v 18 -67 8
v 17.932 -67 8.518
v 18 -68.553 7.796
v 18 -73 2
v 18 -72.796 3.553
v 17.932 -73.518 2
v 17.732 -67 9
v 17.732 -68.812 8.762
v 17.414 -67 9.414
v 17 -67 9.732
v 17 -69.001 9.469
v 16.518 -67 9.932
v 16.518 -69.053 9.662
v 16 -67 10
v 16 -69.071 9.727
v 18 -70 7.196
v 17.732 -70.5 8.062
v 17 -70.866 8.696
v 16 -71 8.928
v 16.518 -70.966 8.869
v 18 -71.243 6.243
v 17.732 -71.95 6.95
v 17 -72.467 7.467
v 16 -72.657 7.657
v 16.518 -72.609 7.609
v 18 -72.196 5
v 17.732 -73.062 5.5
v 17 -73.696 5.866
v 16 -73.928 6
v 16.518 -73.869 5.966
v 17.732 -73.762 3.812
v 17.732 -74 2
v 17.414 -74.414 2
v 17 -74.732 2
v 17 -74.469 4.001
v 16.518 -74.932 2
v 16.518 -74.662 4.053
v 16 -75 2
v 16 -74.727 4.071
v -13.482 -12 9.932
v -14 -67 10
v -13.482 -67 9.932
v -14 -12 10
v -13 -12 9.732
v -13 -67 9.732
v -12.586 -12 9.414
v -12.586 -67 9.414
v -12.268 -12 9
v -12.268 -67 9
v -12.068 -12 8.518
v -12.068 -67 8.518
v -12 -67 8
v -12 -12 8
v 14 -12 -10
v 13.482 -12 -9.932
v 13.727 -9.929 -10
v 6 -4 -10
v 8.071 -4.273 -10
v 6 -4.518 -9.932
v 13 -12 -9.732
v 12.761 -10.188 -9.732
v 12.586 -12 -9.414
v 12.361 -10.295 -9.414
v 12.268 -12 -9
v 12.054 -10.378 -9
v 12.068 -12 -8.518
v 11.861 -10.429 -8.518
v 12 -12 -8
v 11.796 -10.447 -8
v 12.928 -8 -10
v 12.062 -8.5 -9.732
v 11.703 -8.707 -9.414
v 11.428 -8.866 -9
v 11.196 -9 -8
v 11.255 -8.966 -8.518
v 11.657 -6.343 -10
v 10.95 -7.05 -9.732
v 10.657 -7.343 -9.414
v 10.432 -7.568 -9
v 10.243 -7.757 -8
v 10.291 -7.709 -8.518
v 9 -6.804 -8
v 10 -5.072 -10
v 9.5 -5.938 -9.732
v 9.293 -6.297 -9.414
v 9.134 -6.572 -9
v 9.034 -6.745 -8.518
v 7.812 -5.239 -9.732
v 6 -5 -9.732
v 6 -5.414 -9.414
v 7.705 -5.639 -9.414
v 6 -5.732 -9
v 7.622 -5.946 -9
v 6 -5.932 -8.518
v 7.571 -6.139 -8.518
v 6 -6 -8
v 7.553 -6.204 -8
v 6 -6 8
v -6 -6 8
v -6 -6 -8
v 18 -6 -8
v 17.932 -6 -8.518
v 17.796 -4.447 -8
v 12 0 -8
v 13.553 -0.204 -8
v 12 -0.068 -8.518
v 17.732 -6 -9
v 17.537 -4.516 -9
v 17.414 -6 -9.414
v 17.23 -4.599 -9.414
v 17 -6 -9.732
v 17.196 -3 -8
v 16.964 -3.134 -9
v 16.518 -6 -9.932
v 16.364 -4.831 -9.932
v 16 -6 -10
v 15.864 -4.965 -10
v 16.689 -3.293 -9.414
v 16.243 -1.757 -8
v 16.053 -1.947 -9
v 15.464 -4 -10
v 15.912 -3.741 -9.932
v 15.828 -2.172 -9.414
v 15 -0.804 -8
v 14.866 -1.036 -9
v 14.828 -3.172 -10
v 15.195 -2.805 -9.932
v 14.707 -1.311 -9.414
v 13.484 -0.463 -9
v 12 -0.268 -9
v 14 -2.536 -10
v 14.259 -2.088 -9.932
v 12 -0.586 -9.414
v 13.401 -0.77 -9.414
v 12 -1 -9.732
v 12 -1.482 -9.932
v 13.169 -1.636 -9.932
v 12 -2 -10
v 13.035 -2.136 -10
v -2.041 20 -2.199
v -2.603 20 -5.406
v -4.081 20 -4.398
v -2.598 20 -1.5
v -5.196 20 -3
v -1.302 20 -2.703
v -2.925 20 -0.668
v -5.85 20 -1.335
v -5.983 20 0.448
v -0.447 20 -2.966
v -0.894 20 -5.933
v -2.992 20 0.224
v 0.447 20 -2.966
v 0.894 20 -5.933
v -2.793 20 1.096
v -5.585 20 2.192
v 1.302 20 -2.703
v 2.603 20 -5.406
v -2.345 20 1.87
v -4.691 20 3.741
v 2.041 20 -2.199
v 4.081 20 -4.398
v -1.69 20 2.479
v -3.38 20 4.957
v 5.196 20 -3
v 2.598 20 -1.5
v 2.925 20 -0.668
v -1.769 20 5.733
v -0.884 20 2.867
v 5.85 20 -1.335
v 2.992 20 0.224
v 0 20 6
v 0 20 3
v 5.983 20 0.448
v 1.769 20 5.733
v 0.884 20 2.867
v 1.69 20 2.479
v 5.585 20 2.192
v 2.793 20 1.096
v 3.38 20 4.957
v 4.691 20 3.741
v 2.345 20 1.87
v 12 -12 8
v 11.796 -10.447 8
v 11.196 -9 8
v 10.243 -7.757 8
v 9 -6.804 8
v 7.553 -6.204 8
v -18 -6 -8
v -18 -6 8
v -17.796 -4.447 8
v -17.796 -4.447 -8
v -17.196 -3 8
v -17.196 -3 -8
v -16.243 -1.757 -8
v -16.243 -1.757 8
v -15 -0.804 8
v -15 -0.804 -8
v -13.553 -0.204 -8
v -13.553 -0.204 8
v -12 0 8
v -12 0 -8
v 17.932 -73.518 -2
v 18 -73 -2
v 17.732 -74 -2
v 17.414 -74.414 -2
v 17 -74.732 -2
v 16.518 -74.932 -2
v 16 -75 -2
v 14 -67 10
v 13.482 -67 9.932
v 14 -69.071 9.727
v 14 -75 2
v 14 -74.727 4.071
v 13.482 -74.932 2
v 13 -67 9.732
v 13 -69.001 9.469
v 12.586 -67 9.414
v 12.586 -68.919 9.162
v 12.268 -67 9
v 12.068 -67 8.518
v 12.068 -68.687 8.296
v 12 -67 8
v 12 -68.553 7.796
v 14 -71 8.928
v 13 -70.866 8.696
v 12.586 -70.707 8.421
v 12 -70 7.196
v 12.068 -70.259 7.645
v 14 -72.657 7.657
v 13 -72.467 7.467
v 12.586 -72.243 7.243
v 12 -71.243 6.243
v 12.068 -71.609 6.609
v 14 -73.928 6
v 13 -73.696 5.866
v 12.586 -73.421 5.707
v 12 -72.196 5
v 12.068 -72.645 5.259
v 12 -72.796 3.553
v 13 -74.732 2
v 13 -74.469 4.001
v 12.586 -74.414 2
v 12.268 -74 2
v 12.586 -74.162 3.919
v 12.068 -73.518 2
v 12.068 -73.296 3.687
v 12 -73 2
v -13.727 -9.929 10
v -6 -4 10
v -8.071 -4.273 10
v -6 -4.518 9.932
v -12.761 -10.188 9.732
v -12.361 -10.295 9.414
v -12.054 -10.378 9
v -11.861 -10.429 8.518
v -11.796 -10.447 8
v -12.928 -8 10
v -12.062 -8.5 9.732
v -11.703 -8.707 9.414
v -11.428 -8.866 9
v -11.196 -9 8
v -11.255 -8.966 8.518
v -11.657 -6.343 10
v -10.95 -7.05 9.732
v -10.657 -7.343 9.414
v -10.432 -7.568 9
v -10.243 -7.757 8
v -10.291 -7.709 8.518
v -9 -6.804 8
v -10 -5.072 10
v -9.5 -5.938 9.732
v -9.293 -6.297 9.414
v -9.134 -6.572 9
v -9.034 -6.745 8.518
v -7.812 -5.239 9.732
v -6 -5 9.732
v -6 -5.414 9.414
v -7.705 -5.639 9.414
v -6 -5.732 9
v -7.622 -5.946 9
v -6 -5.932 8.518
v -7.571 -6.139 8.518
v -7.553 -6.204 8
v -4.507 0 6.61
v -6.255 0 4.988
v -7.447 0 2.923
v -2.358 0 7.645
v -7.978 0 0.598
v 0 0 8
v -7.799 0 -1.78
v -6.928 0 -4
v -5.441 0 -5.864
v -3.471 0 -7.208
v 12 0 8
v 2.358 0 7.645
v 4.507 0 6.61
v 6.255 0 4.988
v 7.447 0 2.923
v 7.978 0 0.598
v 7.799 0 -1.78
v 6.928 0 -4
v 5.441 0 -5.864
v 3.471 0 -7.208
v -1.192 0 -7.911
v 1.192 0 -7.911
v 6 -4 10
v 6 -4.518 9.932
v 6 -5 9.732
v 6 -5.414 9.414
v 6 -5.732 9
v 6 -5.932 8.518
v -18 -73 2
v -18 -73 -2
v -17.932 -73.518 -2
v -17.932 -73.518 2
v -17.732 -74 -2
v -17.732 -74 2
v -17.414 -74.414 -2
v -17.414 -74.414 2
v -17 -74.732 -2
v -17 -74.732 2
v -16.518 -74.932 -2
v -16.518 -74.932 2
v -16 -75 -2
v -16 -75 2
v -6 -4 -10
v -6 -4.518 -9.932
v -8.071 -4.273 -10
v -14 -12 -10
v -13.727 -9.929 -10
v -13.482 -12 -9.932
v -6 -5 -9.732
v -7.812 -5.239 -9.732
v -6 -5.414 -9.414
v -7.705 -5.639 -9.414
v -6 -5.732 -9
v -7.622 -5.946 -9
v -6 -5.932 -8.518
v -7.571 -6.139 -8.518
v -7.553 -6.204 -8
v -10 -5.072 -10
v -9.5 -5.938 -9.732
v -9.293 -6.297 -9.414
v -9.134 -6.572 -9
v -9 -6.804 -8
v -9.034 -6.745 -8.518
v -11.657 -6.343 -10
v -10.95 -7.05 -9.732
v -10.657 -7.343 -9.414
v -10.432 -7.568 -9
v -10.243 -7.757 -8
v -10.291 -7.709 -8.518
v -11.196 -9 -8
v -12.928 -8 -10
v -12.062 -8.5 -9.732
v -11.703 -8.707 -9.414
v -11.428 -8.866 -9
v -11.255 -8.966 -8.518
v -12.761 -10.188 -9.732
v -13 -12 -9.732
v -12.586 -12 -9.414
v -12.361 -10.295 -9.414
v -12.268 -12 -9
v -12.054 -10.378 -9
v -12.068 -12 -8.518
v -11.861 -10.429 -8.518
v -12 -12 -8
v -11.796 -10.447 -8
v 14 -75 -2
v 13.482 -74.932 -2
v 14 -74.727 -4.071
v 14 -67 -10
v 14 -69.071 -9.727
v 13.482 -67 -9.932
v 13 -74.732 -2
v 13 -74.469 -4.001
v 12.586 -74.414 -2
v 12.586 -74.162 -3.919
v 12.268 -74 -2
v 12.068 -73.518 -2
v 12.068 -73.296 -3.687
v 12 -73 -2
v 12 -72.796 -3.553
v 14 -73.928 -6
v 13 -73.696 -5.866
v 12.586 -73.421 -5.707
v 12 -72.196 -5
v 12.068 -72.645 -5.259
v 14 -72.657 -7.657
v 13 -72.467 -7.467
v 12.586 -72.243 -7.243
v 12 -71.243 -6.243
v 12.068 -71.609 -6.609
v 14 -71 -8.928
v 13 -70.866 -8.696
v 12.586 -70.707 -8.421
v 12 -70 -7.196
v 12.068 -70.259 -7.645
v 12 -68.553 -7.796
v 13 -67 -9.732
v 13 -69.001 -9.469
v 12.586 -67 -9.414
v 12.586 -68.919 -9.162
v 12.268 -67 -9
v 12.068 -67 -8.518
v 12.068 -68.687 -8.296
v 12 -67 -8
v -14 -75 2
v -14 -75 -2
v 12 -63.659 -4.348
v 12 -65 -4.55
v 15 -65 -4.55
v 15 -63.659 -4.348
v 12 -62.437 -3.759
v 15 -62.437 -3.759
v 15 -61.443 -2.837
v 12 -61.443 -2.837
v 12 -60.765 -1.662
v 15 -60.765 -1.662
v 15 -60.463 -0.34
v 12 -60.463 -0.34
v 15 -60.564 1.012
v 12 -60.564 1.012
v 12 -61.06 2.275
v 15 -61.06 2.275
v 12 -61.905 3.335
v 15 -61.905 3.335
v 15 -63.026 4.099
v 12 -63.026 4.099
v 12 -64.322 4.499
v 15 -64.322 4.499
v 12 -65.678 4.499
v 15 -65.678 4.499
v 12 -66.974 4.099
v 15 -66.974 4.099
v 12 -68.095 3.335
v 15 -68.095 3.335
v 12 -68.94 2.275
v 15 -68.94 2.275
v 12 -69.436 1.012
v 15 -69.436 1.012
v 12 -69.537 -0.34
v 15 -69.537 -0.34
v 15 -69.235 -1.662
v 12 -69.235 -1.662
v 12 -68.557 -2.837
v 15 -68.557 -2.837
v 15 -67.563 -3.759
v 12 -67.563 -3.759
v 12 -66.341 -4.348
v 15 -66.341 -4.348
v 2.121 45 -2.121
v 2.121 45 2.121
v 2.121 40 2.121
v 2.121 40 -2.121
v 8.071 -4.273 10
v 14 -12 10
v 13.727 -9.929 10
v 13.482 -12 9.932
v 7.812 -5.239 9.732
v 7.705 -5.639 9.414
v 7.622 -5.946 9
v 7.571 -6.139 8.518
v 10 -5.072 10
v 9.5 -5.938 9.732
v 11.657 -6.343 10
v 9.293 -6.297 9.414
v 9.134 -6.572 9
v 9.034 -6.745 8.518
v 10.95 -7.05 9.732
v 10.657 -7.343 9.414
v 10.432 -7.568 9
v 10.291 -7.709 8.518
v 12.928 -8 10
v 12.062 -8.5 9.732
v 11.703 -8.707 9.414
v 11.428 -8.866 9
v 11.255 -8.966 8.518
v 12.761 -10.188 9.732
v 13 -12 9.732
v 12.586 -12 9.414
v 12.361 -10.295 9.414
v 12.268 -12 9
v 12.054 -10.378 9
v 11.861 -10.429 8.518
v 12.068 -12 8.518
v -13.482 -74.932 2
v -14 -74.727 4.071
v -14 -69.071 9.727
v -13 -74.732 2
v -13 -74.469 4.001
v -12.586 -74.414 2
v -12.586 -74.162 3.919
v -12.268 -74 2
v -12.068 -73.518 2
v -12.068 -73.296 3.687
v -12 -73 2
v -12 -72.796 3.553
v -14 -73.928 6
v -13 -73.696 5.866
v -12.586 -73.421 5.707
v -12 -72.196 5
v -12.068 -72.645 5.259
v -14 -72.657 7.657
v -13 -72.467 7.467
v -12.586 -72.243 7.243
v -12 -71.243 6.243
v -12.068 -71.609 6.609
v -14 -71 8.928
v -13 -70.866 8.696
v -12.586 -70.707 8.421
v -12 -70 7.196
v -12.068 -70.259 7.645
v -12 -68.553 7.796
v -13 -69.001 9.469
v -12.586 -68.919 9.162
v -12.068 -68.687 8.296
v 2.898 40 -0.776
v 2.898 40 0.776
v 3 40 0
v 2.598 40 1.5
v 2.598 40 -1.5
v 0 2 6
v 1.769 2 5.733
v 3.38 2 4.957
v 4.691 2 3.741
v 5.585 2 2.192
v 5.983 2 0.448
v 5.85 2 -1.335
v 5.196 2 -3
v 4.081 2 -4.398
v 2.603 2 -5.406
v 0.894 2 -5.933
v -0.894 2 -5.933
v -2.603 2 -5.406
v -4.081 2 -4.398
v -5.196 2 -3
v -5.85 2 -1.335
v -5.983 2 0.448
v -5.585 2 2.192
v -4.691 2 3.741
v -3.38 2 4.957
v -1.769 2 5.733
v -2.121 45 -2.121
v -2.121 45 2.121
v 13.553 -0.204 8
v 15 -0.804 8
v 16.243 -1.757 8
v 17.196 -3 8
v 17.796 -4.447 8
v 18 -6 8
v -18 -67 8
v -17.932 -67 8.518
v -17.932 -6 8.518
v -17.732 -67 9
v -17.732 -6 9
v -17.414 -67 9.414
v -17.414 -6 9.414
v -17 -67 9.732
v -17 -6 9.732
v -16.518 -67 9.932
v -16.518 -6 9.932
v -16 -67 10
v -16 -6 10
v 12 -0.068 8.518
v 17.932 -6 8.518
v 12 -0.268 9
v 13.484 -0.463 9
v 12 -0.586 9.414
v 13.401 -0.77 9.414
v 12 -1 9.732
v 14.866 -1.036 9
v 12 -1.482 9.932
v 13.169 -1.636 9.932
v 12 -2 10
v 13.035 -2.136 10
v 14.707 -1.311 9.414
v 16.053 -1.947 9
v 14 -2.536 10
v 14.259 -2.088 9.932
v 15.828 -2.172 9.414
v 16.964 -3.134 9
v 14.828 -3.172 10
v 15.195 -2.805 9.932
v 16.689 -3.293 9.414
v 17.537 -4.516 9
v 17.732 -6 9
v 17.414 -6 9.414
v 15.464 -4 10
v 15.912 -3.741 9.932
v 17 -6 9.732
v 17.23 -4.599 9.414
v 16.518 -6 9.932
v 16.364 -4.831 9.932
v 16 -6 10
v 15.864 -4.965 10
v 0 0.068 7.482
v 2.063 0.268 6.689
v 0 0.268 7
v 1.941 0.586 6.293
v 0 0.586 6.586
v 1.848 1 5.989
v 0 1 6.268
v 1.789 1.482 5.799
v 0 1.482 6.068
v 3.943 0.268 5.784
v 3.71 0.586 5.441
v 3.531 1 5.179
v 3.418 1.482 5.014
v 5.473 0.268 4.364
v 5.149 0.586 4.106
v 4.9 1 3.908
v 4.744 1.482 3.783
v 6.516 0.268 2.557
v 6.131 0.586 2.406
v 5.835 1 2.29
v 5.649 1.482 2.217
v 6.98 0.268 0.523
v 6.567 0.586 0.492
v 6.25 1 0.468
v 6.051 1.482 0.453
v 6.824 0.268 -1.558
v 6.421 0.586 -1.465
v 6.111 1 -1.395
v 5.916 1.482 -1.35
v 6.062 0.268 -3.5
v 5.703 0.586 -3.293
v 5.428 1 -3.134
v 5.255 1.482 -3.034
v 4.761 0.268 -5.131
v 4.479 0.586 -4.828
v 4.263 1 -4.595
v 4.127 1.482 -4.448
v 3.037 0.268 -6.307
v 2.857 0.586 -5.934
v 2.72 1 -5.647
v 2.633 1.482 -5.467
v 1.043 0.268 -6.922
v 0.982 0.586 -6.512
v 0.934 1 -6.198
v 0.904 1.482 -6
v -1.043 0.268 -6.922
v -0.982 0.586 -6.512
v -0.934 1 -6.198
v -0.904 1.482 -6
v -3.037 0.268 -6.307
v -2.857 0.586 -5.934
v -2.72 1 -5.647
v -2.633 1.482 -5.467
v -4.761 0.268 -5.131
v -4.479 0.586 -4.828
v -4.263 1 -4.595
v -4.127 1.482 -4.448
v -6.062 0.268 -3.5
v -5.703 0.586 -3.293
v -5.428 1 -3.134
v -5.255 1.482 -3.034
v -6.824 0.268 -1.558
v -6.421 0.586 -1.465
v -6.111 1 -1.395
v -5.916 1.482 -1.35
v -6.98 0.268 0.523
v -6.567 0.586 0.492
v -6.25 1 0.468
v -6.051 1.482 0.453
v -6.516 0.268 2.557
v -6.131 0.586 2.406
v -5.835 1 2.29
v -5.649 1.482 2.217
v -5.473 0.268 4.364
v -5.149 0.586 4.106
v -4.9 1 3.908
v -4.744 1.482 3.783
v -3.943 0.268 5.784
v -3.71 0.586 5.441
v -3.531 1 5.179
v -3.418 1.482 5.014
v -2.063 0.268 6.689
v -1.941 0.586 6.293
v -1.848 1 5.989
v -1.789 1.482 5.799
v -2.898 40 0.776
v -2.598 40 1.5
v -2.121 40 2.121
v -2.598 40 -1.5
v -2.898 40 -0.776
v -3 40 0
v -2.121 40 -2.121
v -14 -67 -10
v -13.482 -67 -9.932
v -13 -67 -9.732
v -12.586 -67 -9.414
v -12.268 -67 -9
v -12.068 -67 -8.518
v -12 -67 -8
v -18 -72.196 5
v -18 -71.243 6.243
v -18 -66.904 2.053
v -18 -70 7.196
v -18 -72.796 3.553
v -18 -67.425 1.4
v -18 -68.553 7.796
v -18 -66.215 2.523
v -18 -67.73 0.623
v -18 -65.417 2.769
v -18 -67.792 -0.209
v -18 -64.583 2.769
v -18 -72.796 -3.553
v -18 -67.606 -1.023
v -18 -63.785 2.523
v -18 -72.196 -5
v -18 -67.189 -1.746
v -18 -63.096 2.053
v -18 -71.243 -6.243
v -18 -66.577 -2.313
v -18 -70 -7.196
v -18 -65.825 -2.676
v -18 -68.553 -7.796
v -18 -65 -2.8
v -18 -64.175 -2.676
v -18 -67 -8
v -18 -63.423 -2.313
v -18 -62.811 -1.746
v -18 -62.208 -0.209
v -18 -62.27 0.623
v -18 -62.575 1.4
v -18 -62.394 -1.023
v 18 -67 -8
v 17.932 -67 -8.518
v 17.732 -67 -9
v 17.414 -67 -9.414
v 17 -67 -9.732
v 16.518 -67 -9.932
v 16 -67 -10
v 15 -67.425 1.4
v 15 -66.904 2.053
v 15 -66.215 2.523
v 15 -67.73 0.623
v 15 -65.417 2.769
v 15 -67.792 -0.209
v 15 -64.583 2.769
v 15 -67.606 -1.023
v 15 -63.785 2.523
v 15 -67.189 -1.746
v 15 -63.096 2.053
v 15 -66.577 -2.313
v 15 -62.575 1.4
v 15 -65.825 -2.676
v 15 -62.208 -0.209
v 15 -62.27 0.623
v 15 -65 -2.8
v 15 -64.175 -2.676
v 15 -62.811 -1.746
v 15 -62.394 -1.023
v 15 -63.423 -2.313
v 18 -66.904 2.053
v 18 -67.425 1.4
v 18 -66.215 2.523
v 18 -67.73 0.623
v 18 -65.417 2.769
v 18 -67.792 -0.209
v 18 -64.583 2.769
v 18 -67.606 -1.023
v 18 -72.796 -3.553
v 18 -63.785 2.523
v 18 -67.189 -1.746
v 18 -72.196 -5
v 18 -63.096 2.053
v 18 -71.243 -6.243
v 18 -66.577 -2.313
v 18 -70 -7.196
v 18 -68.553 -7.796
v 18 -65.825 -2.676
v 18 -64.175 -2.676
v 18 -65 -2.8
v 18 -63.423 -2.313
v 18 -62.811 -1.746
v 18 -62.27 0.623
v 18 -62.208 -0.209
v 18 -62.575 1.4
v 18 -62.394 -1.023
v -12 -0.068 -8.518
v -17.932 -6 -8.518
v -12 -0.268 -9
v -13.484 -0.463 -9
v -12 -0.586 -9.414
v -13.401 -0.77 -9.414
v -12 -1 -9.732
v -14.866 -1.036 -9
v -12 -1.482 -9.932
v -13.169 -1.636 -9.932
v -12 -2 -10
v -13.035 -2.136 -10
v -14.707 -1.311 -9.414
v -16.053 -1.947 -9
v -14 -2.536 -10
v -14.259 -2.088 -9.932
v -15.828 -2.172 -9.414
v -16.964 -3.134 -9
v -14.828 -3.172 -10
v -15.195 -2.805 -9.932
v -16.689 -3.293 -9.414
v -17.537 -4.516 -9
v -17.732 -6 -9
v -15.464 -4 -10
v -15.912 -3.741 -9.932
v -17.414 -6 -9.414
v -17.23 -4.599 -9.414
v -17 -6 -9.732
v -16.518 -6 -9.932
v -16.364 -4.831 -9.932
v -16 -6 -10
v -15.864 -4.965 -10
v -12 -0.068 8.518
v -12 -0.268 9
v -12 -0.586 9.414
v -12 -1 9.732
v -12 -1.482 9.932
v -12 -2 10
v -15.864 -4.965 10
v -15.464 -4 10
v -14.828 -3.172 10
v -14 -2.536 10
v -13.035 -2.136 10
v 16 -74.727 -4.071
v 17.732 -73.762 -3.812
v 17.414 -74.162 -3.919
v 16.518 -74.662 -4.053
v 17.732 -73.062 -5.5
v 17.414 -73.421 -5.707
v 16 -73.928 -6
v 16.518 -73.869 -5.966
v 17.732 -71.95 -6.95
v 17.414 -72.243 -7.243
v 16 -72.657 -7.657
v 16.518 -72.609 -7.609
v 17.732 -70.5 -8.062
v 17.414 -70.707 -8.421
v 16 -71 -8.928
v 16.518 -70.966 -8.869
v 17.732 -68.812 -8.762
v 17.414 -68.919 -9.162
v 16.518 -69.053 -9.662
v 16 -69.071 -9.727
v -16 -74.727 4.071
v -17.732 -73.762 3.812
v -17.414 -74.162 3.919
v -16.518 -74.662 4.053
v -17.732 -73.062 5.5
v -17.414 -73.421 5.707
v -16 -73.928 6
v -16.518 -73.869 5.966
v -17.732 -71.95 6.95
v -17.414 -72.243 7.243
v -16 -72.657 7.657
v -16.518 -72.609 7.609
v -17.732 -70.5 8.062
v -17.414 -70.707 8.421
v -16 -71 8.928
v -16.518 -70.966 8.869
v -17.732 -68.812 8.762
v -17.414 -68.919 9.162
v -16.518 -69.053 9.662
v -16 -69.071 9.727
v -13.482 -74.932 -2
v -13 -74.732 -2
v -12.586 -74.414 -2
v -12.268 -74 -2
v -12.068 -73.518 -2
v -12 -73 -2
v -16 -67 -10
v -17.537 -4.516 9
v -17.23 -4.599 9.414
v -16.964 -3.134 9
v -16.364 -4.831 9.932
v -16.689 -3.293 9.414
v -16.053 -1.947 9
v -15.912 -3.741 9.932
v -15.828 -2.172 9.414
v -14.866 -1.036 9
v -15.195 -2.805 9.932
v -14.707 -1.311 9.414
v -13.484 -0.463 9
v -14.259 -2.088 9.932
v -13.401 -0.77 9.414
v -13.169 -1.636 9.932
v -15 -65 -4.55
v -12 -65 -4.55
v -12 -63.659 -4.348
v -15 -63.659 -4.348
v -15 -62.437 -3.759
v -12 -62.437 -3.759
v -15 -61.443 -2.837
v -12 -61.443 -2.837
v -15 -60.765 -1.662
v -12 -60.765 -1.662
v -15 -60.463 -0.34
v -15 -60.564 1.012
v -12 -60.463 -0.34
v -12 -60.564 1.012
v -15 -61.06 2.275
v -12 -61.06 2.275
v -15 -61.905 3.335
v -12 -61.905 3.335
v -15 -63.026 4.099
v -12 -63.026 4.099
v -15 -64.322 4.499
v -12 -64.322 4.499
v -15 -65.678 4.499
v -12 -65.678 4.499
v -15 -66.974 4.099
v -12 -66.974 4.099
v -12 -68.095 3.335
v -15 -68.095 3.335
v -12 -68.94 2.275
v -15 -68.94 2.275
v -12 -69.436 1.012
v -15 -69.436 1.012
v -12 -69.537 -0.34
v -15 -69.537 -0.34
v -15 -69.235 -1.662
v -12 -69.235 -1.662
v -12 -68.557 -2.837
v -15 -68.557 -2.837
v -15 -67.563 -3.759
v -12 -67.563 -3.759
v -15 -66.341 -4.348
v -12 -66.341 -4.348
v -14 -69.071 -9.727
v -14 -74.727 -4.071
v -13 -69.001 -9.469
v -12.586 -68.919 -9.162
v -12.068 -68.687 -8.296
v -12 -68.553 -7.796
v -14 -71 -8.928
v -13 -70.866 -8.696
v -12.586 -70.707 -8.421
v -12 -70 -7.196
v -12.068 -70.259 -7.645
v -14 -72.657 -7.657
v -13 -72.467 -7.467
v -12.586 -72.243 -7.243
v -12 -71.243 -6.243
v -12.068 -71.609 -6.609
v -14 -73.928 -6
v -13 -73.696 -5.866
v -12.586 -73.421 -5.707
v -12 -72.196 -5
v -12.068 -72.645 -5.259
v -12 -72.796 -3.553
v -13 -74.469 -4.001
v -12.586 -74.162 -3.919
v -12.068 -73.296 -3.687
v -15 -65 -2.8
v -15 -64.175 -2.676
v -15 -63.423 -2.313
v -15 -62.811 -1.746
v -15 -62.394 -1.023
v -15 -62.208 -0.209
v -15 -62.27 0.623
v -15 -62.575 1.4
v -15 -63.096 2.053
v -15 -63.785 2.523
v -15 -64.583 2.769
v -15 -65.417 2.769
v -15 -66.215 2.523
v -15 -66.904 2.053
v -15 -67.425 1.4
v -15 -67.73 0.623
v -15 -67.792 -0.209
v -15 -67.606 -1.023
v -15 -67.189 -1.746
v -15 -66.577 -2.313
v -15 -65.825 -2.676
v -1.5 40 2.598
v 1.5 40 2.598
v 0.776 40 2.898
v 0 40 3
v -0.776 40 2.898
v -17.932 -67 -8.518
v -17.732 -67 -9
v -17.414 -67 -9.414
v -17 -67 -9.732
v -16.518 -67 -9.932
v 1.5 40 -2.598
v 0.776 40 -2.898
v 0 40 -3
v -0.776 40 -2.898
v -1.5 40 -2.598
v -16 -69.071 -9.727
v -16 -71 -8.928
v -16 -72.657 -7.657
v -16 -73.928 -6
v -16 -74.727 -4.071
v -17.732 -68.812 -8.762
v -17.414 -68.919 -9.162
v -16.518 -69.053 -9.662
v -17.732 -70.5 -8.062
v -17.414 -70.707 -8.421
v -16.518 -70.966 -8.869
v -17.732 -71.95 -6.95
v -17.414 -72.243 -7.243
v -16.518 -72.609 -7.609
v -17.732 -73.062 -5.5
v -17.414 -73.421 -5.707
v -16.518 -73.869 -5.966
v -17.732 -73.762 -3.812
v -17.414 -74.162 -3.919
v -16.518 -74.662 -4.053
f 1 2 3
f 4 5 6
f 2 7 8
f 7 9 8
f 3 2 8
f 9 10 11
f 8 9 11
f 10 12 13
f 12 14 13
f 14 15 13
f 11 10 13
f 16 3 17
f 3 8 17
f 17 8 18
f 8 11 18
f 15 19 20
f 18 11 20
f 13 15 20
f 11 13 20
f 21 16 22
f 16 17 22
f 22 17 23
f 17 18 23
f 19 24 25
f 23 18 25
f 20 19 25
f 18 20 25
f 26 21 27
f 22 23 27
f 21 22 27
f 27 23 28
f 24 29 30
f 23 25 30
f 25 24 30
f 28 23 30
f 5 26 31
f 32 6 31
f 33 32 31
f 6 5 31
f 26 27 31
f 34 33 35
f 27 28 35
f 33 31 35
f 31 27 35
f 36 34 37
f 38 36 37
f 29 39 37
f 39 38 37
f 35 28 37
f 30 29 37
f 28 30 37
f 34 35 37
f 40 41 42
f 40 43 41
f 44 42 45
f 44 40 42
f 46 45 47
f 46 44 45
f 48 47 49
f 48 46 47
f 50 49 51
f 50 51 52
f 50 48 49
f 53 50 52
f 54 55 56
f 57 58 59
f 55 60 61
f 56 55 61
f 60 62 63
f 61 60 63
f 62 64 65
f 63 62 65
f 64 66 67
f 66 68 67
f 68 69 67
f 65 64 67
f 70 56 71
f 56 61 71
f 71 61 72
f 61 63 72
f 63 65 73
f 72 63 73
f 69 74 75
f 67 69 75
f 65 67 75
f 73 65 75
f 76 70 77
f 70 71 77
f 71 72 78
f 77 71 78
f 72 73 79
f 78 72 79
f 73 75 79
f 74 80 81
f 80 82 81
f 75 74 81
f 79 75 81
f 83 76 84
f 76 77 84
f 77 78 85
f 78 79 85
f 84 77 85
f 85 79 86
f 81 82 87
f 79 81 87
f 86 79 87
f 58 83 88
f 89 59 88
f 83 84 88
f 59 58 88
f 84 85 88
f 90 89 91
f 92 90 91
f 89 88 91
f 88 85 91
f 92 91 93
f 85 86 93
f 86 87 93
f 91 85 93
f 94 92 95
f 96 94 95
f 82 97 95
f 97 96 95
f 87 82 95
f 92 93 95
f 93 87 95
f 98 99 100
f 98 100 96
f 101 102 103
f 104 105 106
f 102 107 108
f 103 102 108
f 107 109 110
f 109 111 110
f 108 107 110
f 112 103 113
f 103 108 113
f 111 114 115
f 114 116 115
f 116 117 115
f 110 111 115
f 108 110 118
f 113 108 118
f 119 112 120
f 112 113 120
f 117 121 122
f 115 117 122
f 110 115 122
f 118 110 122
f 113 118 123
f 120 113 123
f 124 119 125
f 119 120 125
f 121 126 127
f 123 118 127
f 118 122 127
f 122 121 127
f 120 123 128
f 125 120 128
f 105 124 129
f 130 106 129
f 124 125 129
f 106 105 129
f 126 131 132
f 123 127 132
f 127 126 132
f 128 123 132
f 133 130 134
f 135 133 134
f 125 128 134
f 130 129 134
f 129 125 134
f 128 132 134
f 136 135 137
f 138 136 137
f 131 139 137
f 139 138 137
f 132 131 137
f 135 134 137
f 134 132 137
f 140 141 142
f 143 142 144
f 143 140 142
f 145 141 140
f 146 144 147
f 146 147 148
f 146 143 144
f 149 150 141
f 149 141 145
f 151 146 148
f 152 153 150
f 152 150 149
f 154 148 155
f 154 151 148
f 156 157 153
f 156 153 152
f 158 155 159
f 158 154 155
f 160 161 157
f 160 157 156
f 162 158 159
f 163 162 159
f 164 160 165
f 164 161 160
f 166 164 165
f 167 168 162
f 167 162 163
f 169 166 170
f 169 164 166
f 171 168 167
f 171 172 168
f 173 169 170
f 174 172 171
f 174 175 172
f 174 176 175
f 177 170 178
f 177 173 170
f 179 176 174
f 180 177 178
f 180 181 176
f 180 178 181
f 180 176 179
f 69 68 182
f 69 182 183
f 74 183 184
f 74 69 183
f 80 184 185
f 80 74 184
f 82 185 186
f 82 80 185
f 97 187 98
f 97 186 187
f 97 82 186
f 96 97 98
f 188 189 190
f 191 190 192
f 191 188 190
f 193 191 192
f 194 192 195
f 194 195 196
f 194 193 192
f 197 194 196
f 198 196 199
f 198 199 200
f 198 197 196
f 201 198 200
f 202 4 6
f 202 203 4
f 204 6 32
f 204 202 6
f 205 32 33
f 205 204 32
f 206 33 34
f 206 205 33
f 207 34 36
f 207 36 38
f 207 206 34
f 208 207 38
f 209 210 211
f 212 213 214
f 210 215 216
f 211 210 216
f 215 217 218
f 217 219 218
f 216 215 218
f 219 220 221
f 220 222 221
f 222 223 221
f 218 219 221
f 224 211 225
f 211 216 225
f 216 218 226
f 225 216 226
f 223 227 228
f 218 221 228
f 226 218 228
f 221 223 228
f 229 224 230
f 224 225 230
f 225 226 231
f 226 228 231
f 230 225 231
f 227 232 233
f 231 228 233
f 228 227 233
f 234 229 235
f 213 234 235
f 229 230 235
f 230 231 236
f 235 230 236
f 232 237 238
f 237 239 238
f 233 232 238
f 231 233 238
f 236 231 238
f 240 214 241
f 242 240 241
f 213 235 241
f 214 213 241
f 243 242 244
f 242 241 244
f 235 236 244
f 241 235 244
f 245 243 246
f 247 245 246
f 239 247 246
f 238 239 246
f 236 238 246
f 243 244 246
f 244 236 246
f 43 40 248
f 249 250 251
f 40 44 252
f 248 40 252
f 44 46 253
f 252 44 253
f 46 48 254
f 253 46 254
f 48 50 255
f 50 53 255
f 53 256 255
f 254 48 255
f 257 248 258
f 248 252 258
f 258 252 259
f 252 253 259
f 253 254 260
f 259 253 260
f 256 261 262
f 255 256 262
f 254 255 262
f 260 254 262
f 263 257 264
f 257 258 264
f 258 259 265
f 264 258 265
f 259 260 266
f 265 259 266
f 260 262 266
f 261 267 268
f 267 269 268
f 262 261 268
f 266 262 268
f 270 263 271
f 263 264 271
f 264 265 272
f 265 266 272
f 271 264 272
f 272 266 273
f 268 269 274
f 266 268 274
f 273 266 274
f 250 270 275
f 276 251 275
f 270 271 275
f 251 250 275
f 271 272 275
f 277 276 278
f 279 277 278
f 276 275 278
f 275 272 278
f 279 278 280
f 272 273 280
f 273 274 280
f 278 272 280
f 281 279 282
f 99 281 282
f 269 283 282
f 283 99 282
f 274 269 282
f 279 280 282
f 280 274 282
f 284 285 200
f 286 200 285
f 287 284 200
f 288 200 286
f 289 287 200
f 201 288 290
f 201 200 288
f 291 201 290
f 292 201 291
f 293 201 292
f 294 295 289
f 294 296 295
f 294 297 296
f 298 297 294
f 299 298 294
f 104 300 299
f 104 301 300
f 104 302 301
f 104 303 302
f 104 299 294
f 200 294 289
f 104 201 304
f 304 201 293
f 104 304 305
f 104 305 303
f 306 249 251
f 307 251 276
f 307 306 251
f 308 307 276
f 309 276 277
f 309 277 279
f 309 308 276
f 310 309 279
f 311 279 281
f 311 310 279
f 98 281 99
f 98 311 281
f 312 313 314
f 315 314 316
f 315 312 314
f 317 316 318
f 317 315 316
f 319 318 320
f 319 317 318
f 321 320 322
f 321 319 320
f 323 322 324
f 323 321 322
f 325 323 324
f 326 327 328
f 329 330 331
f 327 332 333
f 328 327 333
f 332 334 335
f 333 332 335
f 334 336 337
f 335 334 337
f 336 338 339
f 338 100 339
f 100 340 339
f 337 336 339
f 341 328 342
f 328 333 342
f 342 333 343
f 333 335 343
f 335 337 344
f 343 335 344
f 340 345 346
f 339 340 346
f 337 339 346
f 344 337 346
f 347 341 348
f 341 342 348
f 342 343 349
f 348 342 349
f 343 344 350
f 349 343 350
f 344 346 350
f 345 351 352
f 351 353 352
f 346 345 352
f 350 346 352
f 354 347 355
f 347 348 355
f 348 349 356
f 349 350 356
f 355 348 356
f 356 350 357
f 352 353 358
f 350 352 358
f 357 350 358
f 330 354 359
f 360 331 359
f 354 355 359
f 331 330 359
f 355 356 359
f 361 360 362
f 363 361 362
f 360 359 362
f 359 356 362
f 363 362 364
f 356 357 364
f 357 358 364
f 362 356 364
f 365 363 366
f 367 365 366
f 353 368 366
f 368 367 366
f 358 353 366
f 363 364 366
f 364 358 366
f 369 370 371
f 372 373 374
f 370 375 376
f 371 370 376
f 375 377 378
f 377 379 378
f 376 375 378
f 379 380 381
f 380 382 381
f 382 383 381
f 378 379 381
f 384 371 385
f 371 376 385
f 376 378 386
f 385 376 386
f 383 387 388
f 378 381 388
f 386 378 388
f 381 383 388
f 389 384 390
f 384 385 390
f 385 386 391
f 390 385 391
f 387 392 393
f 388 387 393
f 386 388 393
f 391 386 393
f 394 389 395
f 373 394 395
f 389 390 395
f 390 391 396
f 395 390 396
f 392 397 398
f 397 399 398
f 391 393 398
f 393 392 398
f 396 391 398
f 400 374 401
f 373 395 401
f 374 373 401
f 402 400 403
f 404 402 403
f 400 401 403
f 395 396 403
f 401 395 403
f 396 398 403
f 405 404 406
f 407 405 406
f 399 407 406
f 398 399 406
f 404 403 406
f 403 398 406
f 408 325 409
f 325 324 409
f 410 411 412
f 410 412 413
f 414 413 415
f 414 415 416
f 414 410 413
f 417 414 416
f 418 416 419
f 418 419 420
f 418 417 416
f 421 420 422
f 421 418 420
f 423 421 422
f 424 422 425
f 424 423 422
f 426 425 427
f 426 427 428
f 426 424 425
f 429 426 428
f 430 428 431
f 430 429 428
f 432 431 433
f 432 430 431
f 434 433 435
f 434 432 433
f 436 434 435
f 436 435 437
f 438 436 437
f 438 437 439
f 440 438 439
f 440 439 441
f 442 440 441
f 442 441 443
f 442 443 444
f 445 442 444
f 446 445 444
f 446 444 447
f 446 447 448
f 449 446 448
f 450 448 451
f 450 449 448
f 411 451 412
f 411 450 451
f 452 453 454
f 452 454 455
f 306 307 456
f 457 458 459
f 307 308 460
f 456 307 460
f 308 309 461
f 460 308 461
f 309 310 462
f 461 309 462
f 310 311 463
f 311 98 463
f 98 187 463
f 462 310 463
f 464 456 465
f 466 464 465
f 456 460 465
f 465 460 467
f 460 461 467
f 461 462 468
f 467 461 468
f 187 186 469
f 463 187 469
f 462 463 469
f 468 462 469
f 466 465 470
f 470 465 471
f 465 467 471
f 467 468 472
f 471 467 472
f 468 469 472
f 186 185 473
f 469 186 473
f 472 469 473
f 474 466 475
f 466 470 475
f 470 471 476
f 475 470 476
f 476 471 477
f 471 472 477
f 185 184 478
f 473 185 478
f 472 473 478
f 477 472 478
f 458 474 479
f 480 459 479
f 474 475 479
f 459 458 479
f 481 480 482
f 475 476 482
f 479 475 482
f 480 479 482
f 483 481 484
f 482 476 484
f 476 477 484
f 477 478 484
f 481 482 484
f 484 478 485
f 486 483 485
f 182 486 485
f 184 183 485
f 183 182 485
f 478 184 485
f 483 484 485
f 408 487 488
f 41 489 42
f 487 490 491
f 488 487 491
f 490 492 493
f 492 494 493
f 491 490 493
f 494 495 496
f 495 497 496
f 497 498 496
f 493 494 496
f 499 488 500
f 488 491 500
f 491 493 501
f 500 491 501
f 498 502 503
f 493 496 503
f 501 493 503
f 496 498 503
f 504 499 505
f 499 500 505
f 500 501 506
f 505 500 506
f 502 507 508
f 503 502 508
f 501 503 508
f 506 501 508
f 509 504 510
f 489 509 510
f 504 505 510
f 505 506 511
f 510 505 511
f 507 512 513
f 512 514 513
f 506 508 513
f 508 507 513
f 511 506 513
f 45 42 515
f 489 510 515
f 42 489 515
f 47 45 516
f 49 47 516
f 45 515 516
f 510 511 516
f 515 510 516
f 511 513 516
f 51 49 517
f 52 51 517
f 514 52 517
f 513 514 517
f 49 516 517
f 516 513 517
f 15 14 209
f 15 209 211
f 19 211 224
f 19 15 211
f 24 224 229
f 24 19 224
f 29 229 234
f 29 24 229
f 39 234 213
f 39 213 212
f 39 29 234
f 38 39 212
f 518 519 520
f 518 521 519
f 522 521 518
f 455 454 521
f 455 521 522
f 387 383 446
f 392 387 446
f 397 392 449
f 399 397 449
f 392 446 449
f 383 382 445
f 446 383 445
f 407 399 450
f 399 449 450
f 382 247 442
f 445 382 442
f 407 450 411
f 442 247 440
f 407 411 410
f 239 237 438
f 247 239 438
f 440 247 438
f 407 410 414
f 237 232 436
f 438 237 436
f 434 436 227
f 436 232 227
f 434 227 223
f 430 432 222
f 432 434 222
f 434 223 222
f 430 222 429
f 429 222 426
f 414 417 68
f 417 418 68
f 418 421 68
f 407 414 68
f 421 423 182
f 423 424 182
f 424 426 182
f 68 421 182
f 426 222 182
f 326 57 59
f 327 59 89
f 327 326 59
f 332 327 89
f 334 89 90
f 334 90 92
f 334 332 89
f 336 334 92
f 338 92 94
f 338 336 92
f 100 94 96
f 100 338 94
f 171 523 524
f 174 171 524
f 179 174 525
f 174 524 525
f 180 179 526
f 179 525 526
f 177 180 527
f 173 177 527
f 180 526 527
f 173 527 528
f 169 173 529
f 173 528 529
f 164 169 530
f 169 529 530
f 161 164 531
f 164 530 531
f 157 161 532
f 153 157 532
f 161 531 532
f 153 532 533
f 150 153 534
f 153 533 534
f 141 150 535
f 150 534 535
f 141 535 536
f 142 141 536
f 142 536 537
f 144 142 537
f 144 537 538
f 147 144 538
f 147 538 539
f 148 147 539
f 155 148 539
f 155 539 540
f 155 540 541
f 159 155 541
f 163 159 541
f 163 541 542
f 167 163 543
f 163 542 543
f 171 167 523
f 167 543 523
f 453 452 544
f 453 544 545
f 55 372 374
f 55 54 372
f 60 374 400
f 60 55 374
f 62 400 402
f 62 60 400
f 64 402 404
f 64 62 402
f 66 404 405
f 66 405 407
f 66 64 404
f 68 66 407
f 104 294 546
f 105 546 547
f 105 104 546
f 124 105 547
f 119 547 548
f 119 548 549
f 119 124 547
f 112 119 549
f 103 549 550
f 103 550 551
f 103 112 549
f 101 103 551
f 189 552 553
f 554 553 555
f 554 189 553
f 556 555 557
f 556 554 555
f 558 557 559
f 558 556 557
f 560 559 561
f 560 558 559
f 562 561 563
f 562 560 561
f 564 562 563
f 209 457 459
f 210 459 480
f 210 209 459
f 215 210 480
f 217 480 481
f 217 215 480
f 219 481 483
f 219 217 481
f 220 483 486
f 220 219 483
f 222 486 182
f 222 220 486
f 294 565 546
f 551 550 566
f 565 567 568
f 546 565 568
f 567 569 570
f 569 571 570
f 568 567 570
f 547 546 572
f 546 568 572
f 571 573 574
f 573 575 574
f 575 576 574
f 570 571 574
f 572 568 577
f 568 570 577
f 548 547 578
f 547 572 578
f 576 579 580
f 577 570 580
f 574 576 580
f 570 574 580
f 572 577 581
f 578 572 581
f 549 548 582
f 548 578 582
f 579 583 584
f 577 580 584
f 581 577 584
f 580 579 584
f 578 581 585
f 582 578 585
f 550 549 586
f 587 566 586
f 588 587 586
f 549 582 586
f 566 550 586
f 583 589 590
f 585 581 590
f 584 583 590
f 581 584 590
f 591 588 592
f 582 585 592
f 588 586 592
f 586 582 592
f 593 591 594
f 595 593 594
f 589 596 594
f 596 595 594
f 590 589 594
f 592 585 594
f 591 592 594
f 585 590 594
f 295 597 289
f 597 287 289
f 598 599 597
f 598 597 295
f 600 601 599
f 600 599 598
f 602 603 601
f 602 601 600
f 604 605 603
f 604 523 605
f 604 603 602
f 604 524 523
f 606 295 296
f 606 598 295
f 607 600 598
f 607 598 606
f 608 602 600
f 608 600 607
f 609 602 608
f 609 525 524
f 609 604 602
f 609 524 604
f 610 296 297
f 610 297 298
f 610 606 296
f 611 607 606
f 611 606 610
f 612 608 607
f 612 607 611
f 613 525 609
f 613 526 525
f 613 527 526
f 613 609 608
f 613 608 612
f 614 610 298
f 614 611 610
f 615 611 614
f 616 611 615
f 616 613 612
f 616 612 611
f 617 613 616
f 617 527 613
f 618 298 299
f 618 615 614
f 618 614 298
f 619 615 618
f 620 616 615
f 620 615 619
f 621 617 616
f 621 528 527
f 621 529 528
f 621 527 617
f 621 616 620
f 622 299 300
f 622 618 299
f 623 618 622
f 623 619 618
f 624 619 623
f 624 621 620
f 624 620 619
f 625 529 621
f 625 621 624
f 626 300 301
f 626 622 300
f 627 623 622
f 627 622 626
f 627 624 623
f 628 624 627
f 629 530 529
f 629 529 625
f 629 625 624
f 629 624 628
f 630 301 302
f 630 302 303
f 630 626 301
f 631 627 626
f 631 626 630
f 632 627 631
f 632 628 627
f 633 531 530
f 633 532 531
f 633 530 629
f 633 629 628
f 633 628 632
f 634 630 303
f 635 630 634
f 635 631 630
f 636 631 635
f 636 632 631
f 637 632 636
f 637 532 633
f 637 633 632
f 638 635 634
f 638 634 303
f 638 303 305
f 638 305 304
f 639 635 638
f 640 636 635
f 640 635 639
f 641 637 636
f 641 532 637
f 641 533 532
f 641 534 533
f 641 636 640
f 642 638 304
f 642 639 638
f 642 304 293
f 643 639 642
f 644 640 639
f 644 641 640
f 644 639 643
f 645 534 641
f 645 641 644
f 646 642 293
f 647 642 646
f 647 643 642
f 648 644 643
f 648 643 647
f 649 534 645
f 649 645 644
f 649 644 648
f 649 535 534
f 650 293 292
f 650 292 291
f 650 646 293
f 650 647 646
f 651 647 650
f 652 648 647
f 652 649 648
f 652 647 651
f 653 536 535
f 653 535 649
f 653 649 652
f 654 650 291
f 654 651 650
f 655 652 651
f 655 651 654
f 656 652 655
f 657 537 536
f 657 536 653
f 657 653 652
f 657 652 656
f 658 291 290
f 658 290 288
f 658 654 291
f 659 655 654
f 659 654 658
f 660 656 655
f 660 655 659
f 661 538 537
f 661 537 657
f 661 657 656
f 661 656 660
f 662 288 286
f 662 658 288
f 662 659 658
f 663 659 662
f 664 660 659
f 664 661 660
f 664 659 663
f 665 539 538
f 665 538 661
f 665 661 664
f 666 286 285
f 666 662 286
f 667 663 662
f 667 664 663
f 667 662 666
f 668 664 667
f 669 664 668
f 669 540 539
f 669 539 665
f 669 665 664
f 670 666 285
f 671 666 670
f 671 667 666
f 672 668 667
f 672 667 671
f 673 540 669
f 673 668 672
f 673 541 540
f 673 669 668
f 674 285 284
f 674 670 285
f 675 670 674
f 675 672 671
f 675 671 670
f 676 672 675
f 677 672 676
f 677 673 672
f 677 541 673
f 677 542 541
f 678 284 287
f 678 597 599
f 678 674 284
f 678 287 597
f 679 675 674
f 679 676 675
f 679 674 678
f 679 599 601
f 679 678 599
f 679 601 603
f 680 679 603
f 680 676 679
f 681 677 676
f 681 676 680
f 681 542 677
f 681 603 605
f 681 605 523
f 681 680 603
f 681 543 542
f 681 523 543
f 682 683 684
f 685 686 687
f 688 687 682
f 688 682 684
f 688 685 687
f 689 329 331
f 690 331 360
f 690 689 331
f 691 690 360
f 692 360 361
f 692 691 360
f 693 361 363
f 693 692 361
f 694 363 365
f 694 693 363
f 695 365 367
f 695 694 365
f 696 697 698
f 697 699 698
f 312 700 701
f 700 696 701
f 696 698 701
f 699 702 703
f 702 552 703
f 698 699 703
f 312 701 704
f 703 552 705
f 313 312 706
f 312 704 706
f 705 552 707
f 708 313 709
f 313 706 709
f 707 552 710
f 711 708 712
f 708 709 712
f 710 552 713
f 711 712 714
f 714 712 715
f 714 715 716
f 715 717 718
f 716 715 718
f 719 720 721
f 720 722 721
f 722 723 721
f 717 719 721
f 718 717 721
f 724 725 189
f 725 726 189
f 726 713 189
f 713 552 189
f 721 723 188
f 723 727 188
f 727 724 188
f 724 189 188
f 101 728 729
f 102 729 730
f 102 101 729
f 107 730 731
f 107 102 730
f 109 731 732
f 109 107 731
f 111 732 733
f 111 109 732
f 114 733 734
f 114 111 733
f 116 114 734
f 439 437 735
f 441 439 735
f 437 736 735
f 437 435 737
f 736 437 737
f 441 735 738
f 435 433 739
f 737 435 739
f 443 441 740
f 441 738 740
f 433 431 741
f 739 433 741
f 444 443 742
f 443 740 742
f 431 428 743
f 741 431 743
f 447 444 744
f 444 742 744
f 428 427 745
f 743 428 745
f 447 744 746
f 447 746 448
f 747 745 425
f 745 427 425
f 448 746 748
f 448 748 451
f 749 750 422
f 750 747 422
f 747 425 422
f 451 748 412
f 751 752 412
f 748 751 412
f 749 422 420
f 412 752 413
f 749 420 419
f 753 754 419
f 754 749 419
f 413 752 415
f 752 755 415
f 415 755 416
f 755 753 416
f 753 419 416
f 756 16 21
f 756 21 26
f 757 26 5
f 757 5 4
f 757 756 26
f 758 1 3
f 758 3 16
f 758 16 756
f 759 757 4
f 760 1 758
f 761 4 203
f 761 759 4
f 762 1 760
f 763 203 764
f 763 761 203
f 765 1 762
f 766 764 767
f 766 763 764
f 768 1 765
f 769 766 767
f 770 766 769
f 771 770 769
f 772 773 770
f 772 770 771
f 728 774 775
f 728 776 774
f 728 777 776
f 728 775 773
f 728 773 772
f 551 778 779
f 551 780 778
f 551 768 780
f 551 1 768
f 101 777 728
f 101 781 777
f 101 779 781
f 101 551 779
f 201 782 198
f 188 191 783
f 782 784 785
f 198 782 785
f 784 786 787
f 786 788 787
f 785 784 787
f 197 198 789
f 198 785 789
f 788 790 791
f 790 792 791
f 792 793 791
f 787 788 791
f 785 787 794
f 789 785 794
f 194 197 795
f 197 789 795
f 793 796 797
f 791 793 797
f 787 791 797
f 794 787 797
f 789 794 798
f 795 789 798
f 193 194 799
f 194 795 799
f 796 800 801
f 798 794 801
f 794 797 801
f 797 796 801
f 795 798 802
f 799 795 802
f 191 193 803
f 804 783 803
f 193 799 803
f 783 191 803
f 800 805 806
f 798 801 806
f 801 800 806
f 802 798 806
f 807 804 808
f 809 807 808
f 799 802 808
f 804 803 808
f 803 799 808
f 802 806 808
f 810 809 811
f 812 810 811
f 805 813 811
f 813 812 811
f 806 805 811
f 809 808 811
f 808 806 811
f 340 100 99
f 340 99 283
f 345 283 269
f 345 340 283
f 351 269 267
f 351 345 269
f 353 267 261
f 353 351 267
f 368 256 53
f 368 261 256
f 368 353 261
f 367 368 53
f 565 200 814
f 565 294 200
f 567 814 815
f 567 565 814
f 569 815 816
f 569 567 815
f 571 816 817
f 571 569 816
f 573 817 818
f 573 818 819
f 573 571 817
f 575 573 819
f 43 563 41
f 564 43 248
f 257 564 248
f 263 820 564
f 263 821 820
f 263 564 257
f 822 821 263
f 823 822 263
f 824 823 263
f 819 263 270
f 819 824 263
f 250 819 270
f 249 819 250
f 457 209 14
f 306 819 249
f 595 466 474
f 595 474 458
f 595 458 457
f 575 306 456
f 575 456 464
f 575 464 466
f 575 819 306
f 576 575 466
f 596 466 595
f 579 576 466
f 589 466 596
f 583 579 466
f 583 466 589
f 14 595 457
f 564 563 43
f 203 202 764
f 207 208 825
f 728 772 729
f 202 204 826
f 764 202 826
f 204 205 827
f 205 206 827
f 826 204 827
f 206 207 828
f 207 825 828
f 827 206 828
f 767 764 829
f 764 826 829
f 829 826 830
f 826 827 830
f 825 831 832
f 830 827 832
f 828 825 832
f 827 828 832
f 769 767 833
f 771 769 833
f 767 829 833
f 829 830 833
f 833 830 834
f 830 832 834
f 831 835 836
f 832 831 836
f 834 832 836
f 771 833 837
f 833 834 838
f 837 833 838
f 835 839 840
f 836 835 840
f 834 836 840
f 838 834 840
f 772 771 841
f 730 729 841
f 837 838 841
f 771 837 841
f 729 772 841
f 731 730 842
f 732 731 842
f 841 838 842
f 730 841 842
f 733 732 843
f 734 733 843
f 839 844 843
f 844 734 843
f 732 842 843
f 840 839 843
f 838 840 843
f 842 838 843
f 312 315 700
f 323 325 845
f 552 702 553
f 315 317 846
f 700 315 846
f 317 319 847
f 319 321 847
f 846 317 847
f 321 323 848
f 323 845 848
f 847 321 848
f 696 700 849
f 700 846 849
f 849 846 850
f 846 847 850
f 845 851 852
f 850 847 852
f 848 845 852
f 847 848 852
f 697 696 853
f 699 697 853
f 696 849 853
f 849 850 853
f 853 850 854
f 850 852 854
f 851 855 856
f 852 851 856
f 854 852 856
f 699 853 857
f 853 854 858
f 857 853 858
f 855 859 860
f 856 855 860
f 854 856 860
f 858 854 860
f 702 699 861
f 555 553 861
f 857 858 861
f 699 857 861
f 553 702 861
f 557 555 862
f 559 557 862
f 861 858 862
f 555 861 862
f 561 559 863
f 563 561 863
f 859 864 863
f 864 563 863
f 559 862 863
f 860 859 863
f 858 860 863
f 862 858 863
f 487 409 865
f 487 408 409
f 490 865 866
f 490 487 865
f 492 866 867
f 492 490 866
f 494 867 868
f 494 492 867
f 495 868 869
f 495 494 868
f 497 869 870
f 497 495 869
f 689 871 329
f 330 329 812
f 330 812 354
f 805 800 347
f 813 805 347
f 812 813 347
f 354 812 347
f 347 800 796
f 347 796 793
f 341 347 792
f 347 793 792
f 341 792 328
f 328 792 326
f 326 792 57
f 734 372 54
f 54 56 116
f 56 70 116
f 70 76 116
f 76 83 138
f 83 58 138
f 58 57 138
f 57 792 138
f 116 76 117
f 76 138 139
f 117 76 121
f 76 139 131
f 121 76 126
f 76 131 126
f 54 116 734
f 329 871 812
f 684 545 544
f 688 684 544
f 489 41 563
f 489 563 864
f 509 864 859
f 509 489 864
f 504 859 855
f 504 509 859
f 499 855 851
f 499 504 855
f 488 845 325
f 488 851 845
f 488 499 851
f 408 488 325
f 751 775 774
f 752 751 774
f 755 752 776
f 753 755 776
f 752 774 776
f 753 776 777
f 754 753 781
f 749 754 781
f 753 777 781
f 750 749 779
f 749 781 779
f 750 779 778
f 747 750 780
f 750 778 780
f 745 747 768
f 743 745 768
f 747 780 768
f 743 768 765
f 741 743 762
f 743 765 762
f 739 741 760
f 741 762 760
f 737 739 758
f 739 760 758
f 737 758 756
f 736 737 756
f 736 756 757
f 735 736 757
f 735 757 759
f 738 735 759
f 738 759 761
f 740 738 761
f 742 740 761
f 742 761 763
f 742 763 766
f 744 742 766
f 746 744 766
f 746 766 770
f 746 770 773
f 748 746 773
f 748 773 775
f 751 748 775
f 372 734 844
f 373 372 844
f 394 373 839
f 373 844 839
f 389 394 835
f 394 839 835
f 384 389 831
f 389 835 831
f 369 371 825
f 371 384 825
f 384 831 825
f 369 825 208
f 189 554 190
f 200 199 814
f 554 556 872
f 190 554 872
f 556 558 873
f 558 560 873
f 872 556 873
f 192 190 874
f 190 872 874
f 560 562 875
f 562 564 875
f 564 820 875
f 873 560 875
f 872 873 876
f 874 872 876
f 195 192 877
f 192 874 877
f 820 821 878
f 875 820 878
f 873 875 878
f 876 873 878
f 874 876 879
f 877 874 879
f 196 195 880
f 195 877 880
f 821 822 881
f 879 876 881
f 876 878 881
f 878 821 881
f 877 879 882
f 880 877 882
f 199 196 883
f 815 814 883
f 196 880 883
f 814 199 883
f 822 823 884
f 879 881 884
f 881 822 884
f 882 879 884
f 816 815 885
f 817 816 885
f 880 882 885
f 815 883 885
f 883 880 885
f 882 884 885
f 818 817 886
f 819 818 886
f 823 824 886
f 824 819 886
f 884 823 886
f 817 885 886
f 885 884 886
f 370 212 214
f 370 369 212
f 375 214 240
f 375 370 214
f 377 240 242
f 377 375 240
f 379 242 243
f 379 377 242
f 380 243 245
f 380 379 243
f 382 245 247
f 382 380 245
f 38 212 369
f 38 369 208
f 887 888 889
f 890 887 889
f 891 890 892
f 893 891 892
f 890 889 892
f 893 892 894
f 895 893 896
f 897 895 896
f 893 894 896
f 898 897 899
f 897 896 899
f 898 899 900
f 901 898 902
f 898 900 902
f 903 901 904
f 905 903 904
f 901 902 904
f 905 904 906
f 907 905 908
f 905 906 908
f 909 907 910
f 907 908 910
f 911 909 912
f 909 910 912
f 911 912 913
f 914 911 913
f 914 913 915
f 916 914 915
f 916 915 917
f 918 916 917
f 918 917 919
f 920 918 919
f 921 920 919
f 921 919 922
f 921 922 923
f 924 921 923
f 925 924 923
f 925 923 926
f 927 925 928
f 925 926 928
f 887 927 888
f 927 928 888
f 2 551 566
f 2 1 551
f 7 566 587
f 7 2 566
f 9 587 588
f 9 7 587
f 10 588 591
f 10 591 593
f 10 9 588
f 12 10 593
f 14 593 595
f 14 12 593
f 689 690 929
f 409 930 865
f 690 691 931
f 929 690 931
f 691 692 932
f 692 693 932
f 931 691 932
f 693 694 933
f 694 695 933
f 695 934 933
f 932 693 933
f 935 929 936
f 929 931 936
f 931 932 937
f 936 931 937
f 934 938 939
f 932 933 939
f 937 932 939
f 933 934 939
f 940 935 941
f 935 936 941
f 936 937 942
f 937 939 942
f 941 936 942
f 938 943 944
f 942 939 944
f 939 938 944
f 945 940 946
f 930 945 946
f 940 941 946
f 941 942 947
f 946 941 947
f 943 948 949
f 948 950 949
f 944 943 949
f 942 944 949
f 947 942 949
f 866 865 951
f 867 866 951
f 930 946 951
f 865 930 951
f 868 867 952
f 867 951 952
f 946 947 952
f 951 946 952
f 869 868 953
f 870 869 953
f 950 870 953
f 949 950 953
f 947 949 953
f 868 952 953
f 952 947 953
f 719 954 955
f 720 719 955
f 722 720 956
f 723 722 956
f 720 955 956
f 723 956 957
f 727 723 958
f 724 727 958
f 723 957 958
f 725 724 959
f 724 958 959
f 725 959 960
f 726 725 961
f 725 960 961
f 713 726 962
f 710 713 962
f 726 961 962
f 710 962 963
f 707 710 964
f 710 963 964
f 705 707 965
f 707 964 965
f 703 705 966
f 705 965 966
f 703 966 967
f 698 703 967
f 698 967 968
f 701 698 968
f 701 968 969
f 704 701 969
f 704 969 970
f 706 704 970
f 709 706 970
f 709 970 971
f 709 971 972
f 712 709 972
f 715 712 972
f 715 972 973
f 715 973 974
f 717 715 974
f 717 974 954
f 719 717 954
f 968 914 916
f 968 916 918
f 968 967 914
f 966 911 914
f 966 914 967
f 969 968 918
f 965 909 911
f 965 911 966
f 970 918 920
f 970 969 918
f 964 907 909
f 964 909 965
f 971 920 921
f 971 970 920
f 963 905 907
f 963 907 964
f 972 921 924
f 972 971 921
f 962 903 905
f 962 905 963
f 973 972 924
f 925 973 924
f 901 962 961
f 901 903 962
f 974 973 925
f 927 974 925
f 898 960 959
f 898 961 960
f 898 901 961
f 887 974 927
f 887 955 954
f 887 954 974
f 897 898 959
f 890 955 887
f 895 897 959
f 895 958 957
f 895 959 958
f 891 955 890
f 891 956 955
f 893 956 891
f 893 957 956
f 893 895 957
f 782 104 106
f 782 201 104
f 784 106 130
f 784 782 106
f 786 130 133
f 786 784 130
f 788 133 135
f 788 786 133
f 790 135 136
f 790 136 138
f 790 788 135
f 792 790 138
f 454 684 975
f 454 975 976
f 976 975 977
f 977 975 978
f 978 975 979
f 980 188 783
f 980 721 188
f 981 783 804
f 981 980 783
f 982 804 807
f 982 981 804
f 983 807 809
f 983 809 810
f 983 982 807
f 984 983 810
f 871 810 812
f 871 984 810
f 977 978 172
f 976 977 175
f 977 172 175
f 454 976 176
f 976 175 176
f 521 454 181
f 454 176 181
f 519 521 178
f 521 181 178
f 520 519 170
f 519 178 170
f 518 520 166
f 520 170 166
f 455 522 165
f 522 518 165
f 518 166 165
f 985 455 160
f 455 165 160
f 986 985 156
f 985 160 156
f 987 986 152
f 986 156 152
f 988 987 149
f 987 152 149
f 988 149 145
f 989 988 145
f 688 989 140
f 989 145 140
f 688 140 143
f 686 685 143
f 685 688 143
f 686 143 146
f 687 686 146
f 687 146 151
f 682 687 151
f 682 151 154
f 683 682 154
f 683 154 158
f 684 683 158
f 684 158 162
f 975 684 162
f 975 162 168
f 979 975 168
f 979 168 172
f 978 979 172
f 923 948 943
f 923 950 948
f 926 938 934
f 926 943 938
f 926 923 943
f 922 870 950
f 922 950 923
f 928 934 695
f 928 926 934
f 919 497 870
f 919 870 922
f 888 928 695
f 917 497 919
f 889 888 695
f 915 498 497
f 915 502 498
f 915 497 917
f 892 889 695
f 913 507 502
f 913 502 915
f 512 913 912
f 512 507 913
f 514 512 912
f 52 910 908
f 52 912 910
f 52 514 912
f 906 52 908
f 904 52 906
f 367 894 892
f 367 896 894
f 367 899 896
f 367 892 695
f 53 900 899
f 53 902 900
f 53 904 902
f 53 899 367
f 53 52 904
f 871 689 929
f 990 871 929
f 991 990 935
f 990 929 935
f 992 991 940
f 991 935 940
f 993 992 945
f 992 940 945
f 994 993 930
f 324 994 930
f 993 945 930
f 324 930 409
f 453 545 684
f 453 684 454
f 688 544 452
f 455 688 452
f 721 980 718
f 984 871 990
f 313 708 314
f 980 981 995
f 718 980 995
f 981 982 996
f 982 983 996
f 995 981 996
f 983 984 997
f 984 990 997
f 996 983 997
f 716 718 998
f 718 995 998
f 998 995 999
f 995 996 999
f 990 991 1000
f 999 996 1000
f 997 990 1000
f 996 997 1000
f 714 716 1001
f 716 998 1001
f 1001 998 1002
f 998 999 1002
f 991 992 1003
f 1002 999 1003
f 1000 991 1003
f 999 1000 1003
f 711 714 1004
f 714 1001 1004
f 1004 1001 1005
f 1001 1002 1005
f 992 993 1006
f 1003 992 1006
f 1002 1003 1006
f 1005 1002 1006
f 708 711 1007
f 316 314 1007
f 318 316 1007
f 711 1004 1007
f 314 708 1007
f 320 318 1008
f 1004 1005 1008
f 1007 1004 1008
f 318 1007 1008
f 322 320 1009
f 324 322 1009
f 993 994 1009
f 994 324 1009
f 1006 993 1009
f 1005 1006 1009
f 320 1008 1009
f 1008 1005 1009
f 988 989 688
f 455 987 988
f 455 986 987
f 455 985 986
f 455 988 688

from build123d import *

# Parameters (mm, degrees)
SKETCH_1_W           = 36
SKETCH_1_H           = 20
EXTRUDE_1_DEPTH      = 75
SKETCH_2_R           = 6
EXTRUDE_2_DEPTH      = 20
SKETCH_7_R           = 3
EXTRUDE_3_DEPTH      = 25
SKETCH_8_OUTSIDE_W   = 63.374
SKETCH_8_OUTSIDE_H   = 47.374
SKETCH_8_OUTSIDE_W_2 = 4.242640688
SKETCH_8_OUTSIDE_H_2 = 4.242640688
CUT_EXTRUDE_6_DEPTH  = 5
SKETCH_3_W           = 24
SKETCH_3_H           = 69
CUT_EXTRUDE_1_DEPTH  = 80.680612447
FILLET_1_R           = 6
FILLET_4_R           = 2
FILLET_3_R           = 8
FILLET_2_R           = 2
SKETCH_4_R           = 2.8
CUT_EXTRUDE_2_DEPTH  = 84.791407674
SKETCH_6_R           = 4.55
CUT_EXTRUDE_4_DEPTH  = 3


with BuildPart() as part:
    # 草图1 → 凸台-拉伸1 (new body)
    with BuildSketch(Plane(origin=(0, 0, 0), x_dir=(1, 0, 0), z_dir=(0, 1, 0))):
        Rectangle(SKETCH_1_W, SKETCH_1_H)
    extrude(amount=-EXTRUDE_1_DEPTH)

    # 草图2 → 凸台-拉伸2 (add)
    with BuildSketch(Plane(origin=(0, 0, 0), x_dir=(1, 0, 0), z_dir=(0, 1, 0))):
        with Locations(Location((0, 0, 0), (0, 0, 270))):
            Circle(SKETCH_2_R)
    extrude(amount=EXTRUDE_2_DEPTH)

    # 草图7 → 凸台-拉伸3 (add)
    with BuildSketch(Plane(origin=(0, 20, 0), x_dir=(1, 0, 0), z_dir=(0, 1, 0))):
        with Locations(Location((0, 0, 0), (0, 0, 270))):
            Circle(SKETCH_7_R)
    extrude(amount=EXTRUDE_3_DEPTH)

    # 草图8 outside → 切除-拉伸6 (cut)
    with BuildSketch(Plane(origin=(0, 45, 0), x_dir=(1, 0, 0), z_dir=(0, 1, 0))):
        Rectangle(SKETCH_8_OUTSIDE_W, SKETCH_8_OUTSIDE_H)
        Rectangle(SKETCH_8_OUTSIDE_W_2, SKETCH_8_OUTSIDE_H_2, mode=Mode.SUBTRACT)
    extrude(amount=-CUT_EXTRUDE_6_DEPTH, mode=Mode.SUBTRACT)

    # 草图3 → 切除-拉伸1 (cut, through all)
    with BuildSketch(Plane.XY.offset(10)):
        with Locations((0, -40.5)):
            Rectangle(SKETCH_3_W, SKETCH_3_H)
    extrude(amount=-CUT_EXTRUDE_1_DEPTH, mode=Mode.SUBTRACT)

    # 圆角1
    fillet_1_edges = [part.edges().sort_by_distance(p)[0] for p in [
        (18, 0, 0),
        (-18, 0, 0),
        (-12, -6, 0),
        (12, -6, 0),
    ]]
    fillet(fillet_1_edges, radius=FILLET_1_R)

    # 圆角4
    fillet_4_edges = [part.edges().sort_by_distance(p)[0] for p in [
        (0, 0, -6),
    ]]
    fillet(fillet_4_edges, radius=FILLET_4_R)

    # 圆角3
    fillet_3_edges = [part.edges().sort_by_distance(p)[0] for p in [
        (15, -75, -10),
        (-15, -75, -10),
        (15, -75, 10),
        (-15, -75, 10),
    ]]
    fillet(fillet_3_edges, radius=FILLET_3_R)

    # 圆角2
    fillet_2_edges = [part.edges().sort_by_distance(p)[0] for p in [
        (12, -72.656854249, 7.656854249),
        (12, -72.656854249, -7.656854249),
        (18, -75, 0),
        (18, -36.5, 10),
        (18, -72.656854249, 7.656854249),
        (18, -72.656854249, -7.656854249),
        (-18, -36.5, 10),
        (-18, -75, 0),
        (-18, -72.656854249, 7.656854249),
        (-18, -72.656854249, -7.656854249),
        (-12, -75, 0),
        (-12, -72.656854249, 7.656854249),
        (-12, -72.656854249, -7.656854249),
        (0, 0, 10),
        (0, 0, -10),
        (-12, -39.5, 10),
        (0, -6, 10),
        (16.242640687, -1.757359313, 10),
        (-16.242640687, -1.757359313, 10),
        (-12, -39.5, -10),
        (0, -6, -10),
        (16.242640687, -1.757359313, -10),
        (-16.242640687, -1.757359313, -10),
        (10.242640687, -7.757359313, 10),
        (10.242640687, -7.757359313, -10),
        (-10.242640687, -7.757359313, 10),
        (-10.242640687, -7.757359313, -10),
        (-18, -36.5, -10),
        (18, -36.5, -10),
        (12, -39.5, -10),
        (12, -39.5, 10),
        (12, -75, 0),
    ]]
    fillet(fillet_2_edges, radius=FILLET_2_R - 0.0001)  # a hair under: the kernel refuses the full size

    # 草图4 → 切除-拉伸2 (cut, through all)
    with BuildSketch(Plane(origin=(18, 0, 0), x_dir=(0, 0, -1), z_dir=(1, 0, 0))):
        with Locations((0, -65)):
            Circle(SKETCH_4_R)
    extrude(amount=-CUT_EXTRUDE_2_DEPTH, mode=Mode.SUBTRACT)

    # 草图6 → 切除-拉伸4 (cut)
    with BuildSketch(Plane(origin=(12, 0, 0), x_dir=(0, 0, -1), z_dir=(1, 0, 0))):
        with Locations((0, -65)):
            Circle(SKETCH_6_R)
    cut_extrude_4 = extrude(amount=CUT_EXTRUDE_4_DEPTH, mode=Mode.SUBTRACT)

    # 镜向1: 切除-拉伸4 across plane
    add(cut_extrude_4.mirror(Plane(origin=(0, 0, 0), x_dir=(0, 0, 1), z_dir=(1, 0, 0))), mode=Mode.SUBTRACT)


solid = part.part
